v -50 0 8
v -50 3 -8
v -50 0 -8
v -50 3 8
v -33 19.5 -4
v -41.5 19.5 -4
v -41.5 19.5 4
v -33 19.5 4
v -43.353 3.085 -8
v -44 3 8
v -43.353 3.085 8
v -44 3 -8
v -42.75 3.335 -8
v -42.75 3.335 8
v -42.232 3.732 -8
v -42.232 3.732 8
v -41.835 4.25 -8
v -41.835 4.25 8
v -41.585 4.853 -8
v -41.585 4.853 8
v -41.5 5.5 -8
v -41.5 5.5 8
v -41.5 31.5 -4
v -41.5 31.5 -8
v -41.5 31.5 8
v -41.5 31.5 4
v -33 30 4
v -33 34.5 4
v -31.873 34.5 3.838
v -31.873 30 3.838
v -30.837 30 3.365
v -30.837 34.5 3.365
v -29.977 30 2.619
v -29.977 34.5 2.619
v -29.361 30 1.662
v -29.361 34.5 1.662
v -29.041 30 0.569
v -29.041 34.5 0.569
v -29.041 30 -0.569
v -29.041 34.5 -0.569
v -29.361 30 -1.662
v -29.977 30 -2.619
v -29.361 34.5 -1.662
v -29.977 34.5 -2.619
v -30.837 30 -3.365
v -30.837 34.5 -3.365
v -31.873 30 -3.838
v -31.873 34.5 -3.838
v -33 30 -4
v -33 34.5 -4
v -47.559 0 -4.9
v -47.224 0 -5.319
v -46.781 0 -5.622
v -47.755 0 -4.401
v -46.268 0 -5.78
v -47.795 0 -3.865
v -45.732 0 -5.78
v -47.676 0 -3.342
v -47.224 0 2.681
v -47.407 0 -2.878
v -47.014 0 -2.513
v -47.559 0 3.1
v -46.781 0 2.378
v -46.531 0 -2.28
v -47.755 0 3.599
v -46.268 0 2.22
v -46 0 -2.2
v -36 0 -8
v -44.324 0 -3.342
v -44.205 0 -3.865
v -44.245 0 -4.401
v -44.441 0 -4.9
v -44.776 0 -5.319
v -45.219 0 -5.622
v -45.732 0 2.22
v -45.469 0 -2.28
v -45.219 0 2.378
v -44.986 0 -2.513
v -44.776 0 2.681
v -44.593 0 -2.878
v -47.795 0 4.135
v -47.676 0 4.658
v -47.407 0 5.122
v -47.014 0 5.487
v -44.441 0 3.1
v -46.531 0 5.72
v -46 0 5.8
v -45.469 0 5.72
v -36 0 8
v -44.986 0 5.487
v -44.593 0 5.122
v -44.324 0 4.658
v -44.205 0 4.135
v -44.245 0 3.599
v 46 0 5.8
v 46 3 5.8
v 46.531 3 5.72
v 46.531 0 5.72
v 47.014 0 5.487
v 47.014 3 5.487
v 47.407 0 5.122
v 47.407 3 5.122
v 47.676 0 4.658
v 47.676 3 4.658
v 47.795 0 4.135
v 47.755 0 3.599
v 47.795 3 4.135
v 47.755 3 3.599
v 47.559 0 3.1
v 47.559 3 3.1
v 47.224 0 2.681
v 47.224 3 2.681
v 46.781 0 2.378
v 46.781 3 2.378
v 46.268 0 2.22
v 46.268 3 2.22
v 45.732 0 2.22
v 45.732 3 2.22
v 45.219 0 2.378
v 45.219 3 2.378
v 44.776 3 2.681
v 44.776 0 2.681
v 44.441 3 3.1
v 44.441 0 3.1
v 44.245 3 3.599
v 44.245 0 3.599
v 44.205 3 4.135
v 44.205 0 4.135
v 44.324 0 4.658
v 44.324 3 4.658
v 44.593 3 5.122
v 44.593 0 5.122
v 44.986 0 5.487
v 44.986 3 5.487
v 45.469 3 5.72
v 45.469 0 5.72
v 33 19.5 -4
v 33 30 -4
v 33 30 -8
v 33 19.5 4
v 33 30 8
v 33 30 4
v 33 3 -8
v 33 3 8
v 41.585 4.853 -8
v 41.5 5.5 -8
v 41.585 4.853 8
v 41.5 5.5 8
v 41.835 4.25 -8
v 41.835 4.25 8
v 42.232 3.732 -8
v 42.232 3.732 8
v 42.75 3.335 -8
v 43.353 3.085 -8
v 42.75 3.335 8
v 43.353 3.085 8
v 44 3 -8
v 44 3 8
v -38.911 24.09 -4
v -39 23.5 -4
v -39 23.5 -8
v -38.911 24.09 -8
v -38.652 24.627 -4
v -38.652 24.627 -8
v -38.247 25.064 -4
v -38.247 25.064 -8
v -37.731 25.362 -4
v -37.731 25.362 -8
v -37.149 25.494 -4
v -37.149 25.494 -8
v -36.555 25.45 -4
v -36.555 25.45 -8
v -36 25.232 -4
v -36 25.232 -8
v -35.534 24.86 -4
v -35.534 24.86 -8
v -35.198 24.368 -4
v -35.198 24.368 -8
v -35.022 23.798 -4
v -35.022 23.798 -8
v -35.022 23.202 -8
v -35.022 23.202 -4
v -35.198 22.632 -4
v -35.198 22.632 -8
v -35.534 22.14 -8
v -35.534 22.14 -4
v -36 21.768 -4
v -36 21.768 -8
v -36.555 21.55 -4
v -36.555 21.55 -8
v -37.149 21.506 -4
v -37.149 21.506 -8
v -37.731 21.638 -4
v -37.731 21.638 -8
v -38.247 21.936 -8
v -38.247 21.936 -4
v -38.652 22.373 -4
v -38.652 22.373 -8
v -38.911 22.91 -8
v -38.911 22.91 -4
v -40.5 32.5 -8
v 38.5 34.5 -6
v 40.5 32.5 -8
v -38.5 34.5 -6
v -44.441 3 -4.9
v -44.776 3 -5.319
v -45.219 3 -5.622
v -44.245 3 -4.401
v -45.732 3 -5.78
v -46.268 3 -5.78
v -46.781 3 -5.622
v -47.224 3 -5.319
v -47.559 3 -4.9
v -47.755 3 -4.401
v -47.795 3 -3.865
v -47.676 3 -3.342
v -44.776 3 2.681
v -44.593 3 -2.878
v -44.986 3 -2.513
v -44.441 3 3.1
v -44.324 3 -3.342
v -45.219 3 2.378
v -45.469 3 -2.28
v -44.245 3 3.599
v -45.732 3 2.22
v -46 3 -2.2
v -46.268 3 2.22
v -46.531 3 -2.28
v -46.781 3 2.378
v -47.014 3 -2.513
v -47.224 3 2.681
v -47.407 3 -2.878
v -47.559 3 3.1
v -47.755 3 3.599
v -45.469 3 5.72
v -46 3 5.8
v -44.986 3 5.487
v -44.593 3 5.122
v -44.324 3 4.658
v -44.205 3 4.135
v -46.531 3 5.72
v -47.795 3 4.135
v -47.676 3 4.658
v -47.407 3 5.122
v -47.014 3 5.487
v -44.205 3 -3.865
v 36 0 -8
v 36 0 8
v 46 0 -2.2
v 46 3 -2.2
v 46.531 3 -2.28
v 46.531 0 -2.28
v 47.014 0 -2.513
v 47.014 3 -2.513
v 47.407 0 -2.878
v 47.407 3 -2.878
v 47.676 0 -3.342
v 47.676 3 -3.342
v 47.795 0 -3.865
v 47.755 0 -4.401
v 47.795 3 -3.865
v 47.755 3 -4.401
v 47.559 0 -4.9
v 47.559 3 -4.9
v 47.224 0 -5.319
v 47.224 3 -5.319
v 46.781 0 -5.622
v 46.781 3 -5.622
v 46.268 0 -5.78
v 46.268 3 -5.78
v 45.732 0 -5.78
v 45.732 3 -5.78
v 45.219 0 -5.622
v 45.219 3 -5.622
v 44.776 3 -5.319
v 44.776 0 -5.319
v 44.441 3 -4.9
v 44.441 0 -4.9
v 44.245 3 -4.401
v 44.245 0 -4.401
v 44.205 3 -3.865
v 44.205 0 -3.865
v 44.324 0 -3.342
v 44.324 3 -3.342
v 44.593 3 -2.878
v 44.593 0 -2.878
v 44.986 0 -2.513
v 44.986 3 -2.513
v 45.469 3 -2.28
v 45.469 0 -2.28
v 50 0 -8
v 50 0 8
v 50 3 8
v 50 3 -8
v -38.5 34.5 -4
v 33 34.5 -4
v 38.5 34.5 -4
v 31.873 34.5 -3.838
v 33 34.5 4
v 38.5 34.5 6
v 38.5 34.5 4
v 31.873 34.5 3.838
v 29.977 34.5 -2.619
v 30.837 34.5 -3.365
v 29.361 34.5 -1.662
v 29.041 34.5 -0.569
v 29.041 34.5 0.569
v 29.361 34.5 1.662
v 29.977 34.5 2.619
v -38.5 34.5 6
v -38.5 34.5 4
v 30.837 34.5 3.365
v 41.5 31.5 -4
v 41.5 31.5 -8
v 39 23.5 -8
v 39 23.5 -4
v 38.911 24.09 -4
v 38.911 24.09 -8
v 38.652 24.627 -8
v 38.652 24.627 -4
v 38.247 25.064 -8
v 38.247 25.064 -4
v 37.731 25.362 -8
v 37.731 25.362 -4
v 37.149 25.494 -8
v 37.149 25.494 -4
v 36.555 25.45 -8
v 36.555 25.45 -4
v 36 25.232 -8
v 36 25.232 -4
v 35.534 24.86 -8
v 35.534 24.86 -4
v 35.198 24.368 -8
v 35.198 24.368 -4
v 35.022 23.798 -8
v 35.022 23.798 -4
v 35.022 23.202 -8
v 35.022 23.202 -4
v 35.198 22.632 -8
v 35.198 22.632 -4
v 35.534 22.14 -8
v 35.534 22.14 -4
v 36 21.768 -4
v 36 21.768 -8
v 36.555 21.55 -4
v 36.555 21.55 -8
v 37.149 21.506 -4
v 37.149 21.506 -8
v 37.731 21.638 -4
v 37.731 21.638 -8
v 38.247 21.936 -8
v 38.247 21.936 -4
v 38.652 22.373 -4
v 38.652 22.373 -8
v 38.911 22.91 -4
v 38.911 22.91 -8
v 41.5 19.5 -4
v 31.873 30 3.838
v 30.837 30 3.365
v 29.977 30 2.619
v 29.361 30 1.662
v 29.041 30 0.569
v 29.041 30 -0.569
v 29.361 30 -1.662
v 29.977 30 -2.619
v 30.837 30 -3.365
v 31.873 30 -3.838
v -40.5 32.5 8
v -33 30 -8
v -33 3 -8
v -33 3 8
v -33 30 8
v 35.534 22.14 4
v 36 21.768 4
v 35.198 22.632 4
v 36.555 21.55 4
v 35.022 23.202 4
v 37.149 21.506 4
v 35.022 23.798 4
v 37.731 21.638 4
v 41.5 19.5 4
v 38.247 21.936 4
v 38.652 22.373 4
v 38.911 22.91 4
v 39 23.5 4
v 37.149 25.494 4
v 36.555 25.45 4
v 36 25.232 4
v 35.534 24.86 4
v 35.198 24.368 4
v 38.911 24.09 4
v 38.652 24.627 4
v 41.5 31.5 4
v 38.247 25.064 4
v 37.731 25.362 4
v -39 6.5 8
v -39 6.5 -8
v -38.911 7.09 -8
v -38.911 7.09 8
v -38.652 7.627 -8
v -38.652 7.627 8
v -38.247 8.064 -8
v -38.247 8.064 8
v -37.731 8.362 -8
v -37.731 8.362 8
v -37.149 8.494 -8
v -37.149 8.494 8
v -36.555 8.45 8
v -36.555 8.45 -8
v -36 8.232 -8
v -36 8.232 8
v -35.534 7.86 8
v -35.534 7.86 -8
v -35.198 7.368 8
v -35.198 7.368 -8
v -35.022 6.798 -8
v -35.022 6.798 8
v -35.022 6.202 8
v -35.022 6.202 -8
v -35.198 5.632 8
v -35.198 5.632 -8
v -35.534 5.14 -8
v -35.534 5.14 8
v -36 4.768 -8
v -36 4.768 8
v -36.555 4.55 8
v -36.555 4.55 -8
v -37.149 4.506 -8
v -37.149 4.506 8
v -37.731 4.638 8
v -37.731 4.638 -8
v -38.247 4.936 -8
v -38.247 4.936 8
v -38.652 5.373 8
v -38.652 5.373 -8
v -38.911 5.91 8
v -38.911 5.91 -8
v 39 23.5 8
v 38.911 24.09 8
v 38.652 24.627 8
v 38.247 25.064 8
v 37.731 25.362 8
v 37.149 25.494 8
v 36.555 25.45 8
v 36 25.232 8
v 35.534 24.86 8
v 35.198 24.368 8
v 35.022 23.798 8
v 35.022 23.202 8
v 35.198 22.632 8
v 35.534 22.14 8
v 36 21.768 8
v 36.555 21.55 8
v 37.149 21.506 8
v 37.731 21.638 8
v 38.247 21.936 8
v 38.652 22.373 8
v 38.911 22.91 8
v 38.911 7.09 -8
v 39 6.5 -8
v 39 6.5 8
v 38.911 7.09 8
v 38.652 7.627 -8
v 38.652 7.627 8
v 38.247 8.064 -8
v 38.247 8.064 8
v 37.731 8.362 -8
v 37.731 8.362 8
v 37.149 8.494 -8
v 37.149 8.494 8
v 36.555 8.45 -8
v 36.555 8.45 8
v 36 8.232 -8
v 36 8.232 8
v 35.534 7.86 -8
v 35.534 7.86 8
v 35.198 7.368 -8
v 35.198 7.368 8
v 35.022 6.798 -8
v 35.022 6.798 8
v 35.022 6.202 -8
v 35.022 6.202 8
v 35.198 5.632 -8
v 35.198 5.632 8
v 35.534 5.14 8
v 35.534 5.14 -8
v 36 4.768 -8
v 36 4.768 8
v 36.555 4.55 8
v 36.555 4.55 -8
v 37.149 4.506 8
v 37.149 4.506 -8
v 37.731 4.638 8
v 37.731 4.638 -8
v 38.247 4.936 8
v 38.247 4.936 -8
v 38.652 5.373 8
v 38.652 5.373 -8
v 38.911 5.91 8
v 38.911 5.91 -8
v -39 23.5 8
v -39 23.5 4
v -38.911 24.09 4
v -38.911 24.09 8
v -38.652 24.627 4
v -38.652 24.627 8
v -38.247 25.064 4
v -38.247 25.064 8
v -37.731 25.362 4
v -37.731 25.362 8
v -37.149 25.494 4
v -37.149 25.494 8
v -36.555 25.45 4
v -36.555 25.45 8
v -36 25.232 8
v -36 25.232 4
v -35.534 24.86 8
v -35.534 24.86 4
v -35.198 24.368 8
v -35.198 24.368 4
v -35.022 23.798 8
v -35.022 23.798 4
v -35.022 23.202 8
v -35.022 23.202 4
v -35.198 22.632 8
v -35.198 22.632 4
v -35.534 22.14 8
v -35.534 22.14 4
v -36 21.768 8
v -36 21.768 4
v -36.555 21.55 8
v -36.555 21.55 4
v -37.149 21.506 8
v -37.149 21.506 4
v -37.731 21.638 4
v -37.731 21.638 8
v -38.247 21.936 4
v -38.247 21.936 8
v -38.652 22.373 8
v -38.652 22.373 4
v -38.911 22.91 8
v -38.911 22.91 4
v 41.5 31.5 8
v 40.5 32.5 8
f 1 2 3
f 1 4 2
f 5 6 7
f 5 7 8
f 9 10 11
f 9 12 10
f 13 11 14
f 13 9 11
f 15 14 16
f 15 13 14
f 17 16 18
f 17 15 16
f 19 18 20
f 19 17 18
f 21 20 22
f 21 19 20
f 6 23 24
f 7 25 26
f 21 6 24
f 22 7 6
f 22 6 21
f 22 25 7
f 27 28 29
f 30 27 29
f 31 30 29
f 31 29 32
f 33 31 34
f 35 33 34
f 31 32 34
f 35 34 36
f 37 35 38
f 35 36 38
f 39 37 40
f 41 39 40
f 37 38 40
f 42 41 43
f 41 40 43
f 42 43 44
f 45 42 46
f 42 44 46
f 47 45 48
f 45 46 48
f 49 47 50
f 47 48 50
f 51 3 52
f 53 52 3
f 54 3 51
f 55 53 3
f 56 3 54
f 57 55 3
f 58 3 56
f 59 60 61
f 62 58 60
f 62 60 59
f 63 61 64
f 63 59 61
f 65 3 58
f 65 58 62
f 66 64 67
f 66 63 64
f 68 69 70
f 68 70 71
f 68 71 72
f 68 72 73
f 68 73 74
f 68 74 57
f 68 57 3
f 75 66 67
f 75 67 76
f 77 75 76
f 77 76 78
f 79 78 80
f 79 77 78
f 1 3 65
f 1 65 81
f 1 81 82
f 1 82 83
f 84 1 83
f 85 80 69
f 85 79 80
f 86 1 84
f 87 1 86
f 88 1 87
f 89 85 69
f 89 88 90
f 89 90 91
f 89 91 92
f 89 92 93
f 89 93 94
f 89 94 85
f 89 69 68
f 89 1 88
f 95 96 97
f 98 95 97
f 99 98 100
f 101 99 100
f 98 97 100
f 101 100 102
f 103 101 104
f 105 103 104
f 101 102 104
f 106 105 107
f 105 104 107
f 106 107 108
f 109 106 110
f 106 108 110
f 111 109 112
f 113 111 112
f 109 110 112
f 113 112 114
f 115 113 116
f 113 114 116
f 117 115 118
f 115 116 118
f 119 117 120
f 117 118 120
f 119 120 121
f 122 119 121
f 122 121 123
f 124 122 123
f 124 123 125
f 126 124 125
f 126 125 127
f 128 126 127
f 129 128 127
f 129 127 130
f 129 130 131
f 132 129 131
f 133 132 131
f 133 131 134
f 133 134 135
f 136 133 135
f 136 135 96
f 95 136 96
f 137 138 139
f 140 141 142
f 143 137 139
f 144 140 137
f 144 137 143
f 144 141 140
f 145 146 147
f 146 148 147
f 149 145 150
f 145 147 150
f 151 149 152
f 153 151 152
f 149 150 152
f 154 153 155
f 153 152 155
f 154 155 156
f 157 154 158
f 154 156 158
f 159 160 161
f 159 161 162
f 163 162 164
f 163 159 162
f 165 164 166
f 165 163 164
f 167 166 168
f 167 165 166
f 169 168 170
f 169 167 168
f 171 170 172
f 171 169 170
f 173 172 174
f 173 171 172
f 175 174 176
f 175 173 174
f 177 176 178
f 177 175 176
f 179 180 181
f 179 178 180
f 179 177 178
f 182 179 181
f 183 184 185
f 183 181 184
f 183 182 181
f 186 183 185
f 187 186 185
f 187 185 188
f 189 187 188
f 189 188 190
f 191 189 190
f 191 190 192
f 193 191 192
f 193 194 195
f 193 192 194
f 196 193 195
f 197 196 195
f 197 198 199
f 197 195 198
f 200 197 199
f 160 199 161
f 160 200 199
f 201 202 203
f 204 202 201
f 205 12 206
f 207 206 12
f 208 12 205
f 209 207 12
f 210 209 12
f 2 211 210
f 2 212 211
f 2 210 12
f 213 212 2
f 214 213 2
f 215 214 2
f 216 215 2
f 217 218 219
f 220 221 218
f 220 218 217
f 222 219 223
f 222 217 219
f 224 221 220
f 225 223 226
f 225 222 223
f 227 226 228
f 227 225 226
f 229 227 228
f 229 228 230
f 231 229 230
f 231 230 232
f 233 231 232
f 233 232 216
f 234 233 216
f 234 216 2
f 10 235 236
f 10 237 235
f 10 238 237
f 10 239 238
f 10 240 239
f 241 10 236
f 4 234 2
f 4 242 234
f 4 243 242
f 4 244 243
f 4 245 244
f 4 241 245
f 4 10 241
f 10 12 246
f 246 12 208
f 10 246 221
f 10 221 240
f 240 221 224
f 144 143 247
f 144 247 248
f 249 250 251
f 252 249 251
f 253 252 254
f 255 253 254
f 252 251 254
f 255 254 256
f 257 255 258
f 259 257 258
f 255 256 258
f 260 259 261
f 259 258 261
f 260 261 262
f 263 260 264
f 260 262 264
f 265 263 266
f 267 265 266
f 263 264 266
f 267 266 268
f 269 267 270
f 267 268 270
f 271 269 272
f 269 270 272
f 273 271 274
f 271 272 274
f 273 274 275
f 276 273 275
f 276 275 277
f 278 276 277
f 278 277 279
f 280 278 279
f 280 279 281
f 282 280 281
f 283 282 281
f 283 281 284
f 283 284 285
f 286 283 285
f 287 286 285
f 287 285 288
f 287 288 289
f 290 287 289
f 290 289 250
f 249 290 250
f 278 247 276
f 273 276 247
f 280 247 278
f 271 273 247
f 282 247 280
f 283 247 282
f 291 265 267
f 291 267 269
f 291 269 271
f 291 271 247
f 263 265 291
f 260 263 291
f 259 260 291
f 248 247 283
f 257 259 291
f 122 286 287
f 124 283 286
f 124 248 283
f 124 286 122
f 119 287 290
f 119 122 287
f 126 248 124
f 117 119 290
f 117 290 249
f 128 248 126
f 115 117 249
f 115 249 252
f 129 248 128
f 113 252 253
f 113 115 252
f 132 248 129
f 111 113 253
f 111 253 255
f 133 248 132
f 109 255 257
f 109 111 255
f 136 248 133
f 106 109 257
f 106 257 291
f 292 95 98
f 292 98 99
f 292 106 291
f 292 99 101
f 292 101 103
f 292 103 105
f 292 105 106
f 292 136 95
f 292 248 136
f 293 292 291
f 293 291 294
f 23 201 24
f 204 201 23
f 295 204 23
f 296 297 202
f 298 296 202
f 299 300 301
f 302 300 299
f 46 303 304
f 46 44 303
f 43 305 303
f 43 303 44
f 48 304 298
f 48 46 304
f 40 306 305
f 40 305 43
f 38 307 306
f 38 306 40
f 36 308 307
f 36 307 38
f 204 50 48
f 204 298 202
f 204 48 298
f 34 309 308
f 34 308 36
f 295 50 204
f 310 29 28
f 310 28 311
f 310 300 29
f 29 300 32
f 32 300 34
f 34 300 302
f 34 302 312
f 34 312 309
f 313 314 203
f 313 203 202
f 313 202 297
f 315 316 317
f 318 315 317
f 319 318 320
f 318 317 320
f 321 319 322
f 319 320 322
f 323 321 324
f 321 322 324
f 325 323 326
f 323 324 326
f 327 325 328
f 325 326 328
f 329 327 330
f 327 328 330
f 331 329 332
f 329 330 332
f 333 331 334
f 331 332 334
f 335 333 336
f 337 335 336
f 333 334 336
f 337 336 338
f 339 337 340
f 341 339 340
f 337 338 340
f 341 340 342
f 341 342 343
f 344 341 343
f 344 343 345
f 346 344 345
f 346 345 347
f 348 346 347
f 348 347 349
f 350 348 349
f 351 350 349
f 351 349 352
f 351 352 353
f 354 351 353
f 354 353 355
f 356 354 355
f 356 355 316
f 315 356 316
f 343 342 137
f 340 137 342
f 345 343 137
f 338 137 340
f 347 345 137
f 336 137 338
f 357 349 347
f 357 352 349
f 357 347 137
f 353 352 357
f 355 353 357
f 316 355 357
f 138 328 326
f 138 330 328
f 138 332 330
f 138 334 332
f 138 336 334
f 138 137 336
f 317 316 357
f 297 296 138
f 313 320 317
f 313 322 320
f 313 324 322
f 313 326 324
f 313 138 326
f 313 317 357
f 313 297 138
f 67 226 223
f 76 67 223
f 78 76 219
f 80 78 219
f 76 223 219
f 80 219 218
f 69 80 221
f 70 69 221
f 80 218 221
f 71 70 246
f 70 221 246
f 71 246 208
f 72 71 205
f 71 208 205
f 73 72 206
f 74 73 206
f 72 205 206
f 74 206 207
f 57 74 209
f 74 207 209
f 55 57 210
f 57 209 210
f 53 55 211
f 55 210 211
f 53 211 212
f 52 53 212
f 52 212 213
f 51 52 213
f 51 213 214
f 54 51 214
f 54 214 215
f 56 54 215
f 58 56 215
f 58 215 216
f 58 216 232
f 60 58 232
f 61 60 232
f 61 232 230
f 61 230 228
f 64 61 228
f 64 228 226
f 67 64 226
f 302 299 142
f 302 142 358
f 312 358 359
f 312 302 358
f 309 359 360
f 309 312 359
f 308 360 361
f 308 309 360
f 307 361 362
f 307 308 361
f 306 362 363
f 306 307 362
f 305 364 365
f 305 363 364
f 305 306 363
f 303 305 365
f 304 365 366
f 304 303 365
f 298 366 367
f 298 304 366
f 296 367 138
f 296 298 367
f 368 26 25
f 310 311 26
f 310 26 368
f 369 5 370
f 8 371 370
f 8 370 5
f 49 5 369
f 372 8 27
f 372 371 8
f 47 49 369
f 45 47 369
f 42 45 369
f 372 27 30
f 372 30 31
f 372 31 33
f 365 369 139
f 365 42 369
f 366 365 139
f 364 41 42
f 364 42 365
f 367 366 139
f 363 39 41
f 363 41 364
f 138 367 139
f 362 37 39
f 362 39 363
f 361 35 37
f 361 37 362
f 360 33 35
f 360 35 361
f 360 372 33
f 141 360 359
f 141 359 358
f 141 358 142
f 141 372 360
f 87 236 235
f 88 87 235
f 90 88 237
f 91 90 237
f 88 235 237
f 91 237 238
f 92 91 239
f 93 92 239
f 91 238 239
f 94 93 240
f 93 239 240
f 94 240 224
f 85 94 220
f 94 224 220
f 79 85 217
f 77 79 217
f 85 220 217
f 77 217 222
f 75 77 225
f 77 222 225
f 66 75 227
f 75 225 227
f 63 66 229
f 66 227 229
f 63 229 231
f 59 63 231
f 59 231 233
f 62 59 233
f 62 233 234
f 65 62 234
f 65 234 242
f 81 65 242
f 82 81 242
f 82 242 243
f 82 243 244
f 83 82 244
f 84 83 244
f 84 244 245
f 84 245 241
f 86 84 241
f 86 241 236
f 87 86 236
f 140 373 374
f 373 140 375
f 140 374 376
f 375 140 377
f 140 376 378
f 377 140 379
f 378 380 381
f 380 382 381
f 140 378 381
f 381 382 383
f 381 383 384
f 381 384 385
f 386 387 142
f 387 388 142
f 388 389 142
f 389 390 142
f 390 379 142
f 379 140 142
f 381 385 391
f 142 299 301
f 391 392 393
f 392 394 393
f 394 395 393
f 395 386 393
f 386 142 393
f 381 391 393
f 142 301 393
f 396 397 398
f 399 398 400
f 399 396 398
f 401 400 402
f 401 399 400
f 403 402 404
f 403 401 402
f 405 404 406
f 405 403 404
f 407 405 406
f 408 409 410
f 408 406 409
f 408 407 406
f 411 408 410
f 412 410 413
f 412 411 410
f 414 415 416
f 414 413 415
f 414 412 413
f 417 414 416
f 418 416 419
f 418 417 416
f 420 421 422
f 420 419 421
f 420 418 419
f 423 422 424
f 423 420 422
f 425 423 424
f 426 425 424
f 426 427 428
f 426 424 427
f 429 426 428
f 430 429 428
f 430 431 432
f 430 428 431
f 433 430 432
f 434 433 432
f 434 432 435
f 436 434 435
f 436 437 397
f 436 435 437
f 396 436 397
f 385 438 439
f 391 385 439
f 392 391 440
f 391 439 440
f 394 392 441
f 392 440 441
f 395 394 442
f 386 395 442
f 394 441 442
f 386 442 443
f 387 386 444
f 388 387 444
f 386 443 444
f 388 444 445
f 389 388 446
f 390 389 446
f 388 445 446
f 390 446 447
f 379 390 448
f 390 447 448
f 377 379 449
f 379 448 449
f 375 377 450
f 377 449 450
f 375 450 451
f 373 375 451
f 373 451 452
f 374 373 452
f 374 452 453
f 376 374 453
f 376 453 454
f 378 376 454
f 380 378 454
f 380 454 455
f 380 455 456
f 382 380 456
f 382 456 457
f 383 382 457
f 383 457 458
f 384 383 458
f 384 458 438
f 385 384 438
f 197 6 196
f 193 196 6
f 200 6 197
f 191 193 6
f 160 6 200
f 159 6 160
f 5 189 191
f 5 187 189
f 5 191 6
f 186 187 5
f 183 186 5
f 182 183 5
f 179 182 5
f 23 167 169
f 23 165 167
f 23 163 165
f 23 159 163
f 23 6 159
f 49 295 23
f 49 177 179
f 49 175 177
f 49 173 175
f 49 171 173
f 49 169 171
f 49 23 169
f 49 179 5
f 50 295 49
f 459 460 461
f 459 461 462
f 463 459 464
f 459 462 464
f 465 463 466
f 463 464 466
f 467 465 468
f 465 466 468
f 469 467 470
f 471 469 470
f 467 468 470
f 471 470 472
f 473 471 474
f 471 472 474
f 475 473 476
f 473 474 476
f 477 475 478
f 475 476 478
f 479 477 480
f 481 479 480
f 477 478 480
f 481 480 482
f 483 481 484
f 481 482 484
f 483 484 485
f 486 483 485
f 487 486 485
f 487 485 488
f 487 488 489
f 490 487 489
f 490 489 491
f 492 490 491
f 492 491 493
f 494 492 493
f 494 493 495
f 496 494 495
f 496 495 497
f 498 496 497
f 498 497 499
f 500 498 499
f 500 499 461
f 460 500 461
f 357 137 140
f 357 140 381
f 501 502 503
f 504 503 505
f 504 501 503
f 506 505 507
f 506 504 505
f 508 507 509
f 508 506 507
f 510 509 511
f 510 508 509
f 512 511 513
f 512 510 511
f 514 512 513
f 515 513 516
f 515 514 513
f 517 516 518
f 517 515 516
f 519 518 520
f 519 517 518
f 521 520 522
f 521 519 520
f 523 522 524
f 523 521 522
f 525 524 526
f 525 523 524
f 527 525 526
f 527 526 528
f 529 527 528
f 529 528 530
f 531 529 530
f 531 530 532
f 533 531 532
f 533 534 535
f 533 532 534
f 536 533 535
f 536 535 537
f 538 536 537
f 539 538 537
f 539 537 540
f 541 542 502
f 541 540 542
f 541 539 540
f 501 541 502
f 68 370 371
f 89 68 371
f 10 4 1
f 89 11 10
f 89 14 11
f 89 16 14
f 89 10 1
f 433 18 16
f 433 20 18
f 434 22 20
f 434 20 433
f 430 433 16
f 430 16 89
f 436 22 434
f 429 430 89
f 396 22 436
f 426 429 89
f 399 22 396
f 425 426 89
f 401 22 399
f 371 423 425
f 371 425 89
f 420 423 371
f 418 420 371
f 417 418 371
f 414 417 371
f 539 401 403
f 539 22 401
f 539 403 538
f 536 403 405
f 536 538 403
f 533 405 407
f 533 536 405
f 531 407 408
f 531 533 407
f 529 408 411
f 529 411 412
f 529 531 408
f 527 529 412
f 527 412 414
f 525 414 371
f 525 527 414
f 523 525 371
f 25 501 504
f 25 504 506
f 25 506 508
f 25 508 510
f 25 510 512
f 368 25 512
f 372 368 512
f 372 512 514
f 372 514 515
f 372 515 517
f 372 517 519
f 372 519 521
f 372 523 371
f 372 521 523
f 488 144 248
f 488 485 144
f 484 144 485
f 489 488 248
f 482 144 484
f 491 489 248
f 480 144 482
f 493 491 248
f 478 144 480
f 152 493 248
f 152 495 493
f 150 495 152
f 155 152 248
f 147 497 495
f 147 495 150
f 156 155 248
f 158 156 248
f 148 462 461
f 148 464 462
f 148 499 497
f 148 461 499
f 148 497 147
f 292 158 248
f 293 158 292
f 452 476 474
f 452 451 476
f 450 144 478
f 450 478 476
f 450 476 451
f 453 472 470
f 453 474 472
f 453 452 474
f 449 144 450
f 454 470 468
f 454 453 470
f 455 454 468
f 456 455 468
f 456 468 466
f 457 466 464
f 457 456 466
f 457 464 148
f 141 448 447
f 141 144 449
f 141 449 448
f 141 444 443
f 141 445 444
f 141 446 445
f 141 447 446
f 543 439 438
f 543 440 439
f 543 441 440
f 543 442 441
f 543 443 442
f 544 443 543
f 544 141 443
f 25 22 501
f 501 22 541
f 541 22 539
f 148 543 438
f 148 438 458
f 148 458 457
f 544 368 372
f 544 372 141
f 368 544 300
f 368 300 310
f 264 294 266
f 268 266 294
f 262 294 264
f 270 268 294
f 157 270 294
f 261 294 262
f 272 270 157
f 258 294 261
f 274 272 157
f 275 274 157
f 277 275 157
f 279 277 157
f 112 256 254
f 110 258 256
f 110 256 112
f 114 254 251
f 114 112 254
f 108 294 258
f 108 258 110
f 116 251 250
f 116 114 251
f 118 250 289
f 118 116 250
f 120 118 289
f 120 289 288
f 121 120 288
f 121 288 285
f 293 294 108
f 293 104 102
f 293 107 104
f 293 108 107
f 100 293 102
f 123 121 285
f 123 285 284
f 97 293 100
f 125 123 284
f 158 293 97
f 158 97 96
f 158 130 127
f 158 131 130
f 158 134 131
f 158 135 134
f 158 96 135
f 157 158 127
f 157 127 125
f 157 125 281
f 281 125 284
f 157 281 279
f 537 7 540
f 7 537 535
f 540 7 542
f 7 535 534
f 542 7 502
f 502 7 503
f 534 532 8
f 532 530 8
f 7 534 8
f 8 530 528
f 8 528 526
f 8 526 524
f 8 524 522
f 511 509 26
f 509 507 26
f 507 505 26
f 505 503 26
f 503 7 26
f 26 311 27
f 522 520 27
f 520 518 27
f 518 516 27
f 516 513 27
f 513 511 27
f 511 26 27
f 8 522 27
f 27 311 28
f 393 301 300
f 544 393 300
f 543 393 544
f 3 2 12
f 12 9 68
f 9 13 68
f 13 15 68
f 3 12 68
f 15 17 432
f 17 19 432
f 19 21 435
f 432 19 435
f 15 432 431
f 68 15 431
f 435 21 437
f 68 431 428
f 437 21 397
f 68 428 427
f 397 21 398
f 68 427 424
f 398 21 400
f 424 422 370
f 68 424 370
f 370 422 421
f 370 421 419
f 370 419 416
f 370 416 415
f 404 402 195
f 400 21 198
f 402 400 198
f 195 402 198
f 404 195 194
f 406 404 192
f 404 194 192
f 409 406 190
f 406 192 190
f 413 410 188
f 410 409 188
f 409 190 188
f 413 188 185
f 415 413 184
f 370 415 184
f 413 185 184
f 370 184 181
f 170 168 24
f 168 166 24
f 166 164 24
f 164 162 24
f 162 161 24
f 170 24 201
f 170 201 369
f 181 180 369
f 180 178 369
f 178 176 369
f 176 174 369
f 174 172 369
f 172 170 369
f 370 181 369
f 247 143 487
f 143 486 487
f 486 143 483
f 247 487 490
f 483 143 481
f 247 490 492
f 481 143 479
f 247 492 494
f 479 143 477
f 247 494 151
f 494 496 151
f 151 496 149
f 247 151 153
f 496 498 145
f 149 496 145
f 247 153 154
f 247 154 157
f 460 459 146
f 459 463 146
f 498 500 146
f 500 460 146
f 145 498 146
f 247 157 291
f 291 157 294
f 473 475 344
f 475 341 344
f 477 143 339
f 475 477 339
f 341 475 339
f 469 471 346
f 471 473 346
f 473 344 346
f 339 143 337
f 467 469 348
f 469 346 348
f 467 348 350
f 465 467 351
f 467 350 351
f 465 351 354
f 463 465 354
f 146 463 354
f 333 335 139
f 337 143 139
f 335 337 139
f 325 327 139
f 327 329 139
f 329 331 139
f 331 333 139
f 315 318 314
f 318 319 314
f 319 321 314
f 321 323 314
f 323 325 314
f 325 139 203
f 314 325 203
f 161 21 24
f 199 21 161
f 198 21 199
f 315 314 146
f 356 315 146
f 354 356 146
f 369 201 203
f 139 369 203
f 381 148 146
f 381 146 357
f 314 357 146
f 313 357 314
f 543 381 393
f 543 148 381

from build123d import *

# Parameters (mm, degrees)
BOSS_EXTRUDE1_DEPTH = 8
CHAMFER5_SIZE       = 3
FILLET1_R           = 2.5
SKETCH2_R           = 2
CUT_EXTRUDE1_DEPTH  = 63.819184968
SKETCH3_R           = 1.8
CUT_EXTRUDE2_DEPTH  = 60.634302209
SKETCH5_W           = 8.5
SKETCH5_H           = 8
CUT_EXTRUDE3_DEPTH  = 15
CUT_EXTRUDE5_DEPTH  = 15
CHAMFER6_SIZE       = 2


with BuildPart() as part:
    # Sketch1 → Boss-Extrude1 (new, symmetric)
    with BuildSketch(Plane.XY):
        Polygon((-50, 0), (-33, 0), (-33, 30), (33, 30), (33, 0), (50, 0), (50, 3), (41.5, 3), (41.5, 34.5), (-41.5, 34.5), (-41.5, 3), (-50, 3), align=None)
    extrude(amount=BOSS_EXTRUDE1_DEPTH, both=True)

    # Chamfer5
    chamfer5_edges = [part.edges().sort_by_distance(p)[0] for p in [
        (-41.5, 34.5, 0),
        (41.5, 34.5, 0),
        (33, 0, 0),
        (-33, 0, 0),
    ]]
    chamfer(chamfer5_edges, length=CHAMFER5_SIZE)

    # Fillet1
    fillet1_edges = [part.edges().sort_by_distance(p)[0] for p in [
        (-41.5, 3, 0),
        (41.5, 3, 0),
    ]]
    fillet(fillet1_edges, radius=FILLET1_R)

    # Sketch2 → Cut-Extrude1 (cut, through all)
    with BuildSketch(Plane.XY.offset(8)):
        with Locations((37, 23.5)):
            Circle(SKETCH2_R)
        with Locations((37, 6.5)):
            Circle(SKETCH2_R)
    cut_extrude1 = extrude(amount=-CUT_EXTRUDE1_DEPTH, mode=Mode.SUBTRACT)

    # Mirror1: Cut-Extrude1 across plane
    add(cut_extrude1.mirror(Plane(origin=(0, 0, 0), x_dir=(0, 0, 1), z_dir=(1, 0, 0))), mode=Mode.SUBTRACT)

    # Sketch3 → Cut-Extrude2 (cut, through all)
    with BuildSketch(Plane(origin=(0, 3, 0), x_dir=(1, 0, 0), z_dir=(0, 1, 0))):
        with Locations(Location((46, 4, 0), (0, 0, 270))):
            Circle(SKETCH3_R)
        with Locations(Location((46, -4, 0), (0, 0, 270))):
            Circle(SKETCH3_R)
        with Locations(Location((-46, 4, 0), (0, 0, 270))):
            Circle(SKETCH3_R)
        with Locations(Location((-46, -4, 0), (0, 0, 270))):
            Circle(SKETCH3_R)
    extrude(amount=-CUT_EXTRUDE2_DEPTH, mode=Mode.SUBTRACT)

    # Sketch5 → Cut-Extrude3 (cut)
    with BuildSketch(Plane(origin=(0, 34.5, 0), x_dir=(1, 0, 0), z_dir=(0, 1, 0))):
        with Locations((37.25, 0)):
            Rectangle(SKETCH5_W, SKETCH5_H)
        with Locations((-37.25, 0)):
            Rectangle(SKETCH5_W, SKETCH5_H)
    extrude(amount=-CUT_EXTRUDE3_DEPTH, mode=Mode.SUBTRACT)

    # Sketch7 → Cut-Extrude5 (cut)
    with BuildSketch(Plane(origin=(0, 34.5, 0), x_dir=(1, 0, 0), z_dir=(0, 1, 0))):
        with BuildLine():
            Line((33, 4), (33, -4))
            ThreePointArc((33, -4), (29, 0), (33, 4))
        make_face()
        with BuildLine():
            Line((-33, 4), (-33, -4))
            ThreePointArc((-33, -4), (-29, 0), (-33, 4))
        make_face()
    extrude(amount=-CUT_EXTRUDE5_DEPTH, mode=Mode.SUBTRACT)

    # Chamfer6
    chamfer6_edges = [part.edges().sort_by_distance(p)[0] for p in [
        (0, 34.5, -8),
        (0, 34.5, 8),
    ]]
    chamfer(chamfer6_edges, length=CHAMFER6_SIZE)


solid = part.part
